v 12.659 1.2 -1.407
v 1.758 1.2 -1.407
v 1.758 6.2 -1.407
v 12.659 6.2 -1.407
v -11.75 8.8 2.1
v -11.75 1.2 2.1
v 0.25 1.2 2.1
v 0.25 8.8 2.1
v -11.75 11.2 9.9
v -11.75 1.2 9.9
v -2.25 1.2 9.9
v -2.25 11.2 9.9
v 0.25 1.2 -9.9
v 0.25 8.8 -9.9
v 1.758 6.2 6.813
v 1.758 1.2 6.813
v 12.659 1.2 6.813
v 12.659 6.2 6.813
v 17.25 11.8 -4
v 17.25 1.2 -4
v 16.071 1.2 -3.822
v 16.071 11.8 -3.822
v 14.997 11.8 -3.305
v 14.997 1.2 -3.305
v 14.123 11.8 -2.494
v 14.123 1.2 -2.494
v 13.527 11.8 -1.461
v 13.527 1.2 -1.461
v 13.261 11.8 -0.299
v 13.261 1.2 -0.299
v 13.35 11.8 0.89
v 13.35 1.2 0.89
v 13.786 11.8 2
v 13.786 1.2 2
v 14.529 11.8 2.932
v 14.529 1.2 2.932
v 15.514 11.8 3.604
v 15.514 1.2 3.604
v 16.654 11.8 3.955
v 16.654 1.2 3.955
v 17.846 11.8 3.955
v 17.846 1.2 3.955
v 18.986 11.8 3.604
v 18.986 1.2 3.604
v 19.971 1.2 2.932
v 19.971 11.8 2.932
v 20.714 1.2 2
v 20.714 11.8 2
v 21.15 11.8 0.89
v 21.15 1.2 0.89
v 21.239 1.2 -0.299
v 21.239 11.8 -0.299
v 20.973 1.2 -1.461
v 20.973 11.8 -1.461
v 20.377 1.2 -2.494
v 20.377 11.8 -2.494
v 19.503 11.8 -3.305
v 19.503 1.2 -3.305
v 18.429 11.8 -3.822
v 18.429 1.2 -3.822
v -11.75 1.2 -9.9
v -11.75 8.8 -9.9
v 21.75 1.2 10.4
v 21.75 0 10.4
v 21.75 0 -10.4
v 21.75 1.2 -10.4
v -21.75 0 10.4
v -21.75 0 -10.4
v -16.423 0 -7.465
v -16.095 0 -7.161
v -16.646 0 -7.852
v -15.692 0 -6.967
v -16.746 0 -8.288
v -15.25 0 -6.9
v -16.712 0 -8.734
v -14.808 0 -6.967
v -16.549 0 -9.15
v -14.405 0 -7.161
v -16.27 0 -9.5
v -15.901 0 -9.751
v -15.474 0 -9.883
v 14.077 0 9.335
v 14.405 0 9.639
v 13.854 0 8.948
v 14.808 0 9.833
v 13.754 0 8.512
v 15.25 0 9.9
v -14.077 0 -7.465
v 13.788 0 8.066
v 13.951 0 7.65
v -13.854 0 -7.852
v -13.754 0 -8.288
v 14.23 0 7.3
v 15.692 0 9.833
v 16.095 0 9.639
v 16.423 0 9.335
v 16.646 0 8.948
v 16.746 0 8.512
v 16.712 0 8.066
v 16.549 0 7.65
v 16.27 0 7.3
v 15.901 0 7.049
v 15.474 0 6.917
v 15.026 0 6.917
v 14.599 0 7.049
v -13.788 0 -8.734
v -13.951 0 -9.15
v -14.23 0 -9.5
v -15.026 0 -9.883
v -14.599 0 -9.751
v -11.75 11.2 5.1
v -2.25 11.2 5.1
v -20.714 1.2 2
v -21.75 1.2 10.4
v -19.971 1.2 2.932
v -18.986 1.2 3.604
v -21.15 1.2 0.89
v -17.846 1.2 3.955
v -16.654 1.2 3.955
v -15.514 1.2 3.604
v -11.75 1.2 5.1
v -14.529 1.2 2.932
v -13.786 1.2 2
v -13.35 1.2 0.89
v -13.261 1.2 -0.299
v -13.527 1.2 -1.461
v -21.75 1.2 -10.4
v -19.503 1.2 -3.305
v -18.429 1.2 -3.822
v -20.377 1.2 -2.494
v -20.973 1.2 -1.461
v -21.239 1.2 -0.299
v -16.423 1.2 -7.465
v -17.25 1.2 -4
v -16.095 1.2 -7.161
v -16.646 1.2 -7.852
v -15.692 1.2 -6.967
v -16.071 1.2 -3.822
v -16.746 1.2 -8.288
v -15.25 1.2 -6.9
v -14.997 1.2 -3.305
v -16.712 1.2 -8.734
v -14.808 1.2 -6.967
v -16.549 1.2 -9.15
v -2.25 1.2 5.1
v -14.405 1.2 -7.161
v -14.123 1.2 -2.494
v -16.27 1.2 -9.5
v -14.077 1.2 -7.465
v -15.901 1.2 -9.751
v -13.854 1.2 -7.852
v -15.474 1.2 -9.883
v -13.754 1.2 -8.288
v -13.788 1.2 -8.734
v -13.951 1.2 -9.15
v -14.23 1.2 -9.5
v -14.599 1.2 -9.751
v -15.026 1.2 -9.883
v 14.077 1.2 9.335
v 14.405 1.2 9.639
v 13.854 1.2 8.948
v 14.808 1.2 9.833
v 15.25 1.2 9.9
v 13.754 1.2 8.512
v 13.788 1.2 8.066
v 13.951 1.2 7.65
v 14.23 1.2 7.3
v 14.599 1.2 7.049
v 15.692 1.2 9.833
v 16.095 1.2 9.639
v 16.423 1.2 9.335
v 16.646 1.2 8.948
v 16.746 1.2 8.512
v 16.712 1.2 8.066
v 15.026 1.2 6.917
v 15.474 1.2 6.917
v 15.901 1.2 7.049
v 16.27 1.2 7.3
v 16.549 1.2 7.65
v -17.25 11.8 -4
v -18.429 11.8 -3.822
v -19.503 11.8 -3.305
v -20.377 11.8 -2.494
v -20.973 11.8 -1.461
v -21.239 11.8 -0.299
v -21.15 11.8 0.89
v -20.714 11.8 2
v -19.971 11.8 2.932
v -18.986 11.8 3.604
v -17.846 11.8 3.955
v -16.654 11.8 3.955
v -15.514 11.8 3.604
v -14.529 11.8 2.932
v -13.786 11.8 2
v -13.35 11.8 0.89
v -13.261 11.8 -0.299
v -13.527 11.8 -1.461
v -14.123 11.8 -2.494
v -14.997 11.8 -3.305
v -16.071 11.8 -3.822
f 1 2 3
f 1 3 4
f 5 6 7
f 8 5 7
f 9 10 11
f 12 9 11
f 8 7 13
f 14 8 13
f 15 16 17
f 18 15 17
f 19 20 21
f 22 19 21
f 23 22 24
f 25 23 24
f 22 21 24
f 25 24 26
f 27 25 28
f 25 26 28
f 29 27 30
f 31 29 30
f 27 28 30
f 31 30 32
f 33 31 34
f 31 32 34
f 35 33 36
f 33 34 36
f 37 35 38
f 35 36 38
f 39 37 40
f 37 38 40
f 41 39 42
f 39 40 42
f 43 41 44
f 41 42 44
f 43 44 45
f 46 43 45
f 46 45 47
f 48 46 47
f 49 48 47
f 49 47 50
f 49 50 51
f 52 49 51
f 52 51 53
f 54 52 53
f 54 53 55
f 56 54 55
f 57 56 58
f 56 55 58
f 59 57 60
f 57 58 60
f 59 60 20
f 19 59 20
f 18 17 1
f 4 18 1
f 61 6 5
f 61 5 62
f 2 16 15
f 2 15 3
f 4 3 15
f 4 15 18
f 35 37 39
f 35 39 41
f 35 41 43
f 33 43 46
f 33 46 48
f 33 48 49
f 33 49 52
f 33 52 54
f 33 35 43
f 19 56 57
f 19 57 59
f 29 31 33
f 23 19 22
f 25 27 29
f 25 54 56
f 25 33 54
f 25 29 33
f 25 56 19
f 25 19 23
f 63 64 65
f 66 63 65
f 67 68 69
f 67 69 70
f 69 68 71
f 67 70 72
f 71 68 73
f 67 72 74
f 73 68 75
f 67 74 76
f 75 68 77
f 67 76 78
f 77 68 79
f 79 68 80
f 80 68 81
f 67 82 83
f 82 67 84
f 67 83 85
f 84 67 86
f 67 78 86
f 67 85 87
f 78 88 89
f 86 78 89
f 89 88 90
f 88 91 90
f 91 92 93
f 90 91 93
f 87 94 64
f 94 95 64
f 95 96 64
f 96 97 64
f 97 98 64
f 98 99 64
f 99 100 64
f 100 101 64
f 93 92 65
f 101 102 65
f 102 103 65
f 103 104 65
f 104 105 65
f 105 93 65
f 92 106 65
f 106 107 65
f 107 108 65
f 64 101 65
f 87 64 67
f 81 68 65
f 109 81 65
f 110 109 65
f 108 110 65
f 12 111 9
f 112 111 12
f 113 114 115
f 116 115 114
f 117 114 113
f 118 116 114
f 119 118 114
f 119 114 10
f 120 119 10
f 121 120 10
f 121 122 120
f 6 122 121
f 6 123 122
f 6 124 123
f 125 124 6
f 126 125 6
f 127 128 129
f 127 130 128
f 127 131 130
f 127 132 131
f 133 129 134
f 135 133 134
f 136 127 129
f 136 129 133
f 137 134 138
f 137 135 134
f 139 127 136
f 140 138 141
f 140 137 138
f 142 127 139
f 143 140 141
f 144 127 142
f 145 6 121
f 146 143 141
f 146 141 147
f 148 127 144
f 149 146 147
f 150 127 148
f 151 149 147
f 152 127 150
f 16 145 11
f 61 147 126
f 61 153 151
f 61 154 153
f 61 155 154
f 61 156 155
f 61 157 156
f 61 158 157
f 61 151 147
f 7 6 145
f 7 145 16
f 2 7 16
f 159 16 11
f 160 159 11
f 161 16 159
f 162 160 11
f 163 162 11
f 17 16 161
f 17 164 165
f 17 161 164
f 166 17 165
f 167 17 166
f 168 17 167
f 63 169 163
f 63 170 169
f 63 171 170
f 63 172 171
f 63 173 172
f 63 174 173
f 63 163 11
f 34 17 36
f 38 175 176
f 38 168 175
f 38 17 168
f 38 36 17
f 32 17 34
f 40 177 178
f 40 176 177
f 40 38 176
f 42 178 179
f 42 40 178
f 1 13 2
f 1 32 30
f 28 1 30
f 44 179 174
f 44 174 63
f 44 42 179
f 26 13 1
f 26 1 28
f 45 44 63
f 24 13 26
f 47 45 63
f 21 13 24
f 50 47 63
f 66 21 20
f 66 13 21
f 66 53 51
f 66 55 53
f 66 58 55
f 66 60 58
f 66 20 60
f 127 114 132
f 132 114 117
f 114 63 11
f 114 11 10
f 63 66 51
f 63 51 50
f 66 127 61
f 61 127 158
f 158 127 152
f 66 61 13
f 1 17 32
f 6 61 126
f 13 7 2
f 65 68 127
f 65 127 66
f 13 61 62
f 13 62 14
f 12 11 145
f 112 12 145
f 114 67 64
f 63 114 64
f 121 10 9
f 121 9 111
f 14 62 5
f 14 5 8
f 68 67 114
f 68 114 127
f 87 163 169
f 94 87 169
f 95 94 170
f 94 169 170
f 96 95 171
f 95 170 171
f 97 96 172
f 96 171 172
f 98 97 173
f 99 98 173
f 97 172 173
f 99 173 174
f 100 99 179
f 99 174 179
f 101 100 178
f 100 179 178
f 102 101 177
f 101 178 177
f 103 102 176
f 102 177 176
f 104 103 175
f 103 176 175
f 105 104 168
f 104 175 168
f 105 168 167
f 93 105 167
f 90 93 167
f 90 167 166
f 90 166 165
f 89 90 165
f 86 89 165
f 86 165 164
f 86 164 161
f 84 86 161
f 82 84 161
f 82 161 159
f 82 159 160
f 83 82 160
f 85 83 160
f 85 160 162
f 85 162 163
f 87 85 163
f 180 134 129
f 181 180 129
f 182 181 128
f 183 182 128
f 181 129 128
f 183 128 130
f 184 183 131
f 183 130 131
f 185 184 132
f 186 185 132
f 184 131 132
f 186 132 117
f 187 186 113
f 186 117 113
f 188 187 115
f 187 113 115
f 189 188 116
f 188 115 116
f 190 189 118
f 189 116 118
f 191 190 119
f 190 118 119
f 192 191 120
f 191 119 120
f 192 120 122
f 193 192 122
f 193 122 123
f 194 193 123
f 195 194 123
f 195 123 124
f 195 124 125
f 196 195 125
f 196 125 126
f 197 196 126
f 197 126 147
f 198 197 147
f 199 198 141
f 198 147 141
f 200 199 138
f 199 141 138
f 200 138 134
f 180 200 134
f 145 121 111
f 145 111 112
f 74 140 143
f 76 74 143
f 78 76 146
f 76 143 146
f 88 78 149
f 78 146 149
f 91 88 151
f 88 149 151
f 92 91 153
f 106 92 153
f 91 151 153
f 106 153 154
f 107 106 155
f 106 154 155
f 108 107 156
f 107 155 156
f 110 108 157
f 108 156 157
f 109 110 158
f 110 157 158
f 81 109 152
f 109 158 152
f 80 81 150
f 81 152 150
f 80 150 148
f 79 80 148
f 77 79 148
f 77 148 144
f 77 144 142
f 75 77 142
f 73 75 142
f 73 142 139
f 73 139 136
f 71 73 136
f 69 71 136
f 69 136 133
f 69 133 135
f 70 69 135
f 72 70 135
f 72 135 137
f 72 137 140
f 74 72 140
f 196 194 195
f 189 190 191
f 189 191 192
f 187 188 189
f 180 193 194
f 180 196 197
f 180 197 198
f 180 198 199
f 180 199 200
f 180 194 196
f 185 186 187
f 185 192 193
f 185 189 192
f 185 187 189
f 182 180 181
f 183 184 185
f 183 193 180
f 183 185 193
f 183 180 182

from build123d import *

# Parameters (mm, degrees)
SKETCH_1_W          = 43.5
SKETCH_1_H          = 20.8
EXTRUDE_1_DEPTH     = 1.2
SKETCH_2_W          = 12
SKETCH_2_H          = 12
EXTRUDE_2_DEPTH     = 7.6
SKETCH_3_R          = 4
EXTRUDE_3_DEPTH     = 10.6
SKETCH_4_W          = 9.5
SKETCH_4_H          = 4.8
EXTRUDE_4_DEPTH     = 10
SKETCH_5_W          = 10.901177872
SKETCH_5_H          = 8.219839766
EXTRUDE_5_DEPTH     = 5
SKETCH_6_R          = 1.5
CUT_EXTRUDE_1_DEPTH = 5


with BuildPart() as part:
    # 草图1 → 凸台-拉伸1 (new body)
    with BuildSketch(Plane(origin=(0, 0, 0), x_dir=(1, 0, 0), z_dir=(0, 1, 0))):
        Rectangle(SKETCH_1_W, SKETCH_1_H)
    extrude(amount=EXTRUDE_1_DEPTH)

    # 草图2 → 凸台-拉伸2 (add)
    with BuildSketch(Plane(origin=(0, 1.2, 0), x_dir=(1, 0, 0), z_dir=(0, 1, 0))):
        with Locations((-5.75, 3.9)):
            Rectangle(SKETCH_2_W, SKETCH_2_H)
    extrude(amount=EXTRUDE_2_DEPTH)

    # 草图3 → 凸台-拉伸3 (add)
    with BuildSketch(Plane(origin=(0, 1.2, 0), x_dir=(1, 0, 0), z_dir=(0, 1, 0))):
        with Locations(Location((-17.25, 0, 0), (0, 0, 90))):
            Circle(SKETCH_3_R)
        with Locations(Location((17.25, 0, 0), (0, 0, 90))):
            Circle(SKETCH_3_R)
    extrude(amount=EXTRUDE_3_DEPTH)

    # 草图4 → 凸台-拉伸4 (add)
    with BuildSketch(Plane(origin=(0, 1.2, 0), x_dir=(1, 0, 0), z_dir=(0, 1, 0))):
        with Locations((-7, -7.5)):
            Rectangle(SKETCH_4_W, SKETCH_4_H)
    extrude(amount=EXTRUDE_4_DEPTH)

    # 草图5 → 凸台-拉伸5 (add)
    with BuildSketch(Plane(origin=(0, 1.2, 0), x_dir=(1, 0, 0), z_dir=(0, 1, 0))):
        with Locations((7.208843432, -2.703316287)):
            Rectangle(SKETCH_5_W, SKETCH_5_H)
    extrude(amount=EXTRUDE_5_DEPTH)

    # 草图6 → 切除-拉伸1 (cut)
    with BuildSketch(Plane(origin=(0, 1.2, 0), x_dir=(1, 0, 0), z_dir=(0, 1, 0))):
        with Locations(Location((15.25, -8.4, 0), (0, 0, 270))):
            Circle(SKETCH_6_R)
        with Locations(Location((-15.25, 8.4, 0), (0, 0, 270))):
            Circle(SKETCH_6_R)
    extrude(amount=-CUT_EXTRUDE_1_DEPTH, mode=Mode.SUBTRACT)


solid = part.part
